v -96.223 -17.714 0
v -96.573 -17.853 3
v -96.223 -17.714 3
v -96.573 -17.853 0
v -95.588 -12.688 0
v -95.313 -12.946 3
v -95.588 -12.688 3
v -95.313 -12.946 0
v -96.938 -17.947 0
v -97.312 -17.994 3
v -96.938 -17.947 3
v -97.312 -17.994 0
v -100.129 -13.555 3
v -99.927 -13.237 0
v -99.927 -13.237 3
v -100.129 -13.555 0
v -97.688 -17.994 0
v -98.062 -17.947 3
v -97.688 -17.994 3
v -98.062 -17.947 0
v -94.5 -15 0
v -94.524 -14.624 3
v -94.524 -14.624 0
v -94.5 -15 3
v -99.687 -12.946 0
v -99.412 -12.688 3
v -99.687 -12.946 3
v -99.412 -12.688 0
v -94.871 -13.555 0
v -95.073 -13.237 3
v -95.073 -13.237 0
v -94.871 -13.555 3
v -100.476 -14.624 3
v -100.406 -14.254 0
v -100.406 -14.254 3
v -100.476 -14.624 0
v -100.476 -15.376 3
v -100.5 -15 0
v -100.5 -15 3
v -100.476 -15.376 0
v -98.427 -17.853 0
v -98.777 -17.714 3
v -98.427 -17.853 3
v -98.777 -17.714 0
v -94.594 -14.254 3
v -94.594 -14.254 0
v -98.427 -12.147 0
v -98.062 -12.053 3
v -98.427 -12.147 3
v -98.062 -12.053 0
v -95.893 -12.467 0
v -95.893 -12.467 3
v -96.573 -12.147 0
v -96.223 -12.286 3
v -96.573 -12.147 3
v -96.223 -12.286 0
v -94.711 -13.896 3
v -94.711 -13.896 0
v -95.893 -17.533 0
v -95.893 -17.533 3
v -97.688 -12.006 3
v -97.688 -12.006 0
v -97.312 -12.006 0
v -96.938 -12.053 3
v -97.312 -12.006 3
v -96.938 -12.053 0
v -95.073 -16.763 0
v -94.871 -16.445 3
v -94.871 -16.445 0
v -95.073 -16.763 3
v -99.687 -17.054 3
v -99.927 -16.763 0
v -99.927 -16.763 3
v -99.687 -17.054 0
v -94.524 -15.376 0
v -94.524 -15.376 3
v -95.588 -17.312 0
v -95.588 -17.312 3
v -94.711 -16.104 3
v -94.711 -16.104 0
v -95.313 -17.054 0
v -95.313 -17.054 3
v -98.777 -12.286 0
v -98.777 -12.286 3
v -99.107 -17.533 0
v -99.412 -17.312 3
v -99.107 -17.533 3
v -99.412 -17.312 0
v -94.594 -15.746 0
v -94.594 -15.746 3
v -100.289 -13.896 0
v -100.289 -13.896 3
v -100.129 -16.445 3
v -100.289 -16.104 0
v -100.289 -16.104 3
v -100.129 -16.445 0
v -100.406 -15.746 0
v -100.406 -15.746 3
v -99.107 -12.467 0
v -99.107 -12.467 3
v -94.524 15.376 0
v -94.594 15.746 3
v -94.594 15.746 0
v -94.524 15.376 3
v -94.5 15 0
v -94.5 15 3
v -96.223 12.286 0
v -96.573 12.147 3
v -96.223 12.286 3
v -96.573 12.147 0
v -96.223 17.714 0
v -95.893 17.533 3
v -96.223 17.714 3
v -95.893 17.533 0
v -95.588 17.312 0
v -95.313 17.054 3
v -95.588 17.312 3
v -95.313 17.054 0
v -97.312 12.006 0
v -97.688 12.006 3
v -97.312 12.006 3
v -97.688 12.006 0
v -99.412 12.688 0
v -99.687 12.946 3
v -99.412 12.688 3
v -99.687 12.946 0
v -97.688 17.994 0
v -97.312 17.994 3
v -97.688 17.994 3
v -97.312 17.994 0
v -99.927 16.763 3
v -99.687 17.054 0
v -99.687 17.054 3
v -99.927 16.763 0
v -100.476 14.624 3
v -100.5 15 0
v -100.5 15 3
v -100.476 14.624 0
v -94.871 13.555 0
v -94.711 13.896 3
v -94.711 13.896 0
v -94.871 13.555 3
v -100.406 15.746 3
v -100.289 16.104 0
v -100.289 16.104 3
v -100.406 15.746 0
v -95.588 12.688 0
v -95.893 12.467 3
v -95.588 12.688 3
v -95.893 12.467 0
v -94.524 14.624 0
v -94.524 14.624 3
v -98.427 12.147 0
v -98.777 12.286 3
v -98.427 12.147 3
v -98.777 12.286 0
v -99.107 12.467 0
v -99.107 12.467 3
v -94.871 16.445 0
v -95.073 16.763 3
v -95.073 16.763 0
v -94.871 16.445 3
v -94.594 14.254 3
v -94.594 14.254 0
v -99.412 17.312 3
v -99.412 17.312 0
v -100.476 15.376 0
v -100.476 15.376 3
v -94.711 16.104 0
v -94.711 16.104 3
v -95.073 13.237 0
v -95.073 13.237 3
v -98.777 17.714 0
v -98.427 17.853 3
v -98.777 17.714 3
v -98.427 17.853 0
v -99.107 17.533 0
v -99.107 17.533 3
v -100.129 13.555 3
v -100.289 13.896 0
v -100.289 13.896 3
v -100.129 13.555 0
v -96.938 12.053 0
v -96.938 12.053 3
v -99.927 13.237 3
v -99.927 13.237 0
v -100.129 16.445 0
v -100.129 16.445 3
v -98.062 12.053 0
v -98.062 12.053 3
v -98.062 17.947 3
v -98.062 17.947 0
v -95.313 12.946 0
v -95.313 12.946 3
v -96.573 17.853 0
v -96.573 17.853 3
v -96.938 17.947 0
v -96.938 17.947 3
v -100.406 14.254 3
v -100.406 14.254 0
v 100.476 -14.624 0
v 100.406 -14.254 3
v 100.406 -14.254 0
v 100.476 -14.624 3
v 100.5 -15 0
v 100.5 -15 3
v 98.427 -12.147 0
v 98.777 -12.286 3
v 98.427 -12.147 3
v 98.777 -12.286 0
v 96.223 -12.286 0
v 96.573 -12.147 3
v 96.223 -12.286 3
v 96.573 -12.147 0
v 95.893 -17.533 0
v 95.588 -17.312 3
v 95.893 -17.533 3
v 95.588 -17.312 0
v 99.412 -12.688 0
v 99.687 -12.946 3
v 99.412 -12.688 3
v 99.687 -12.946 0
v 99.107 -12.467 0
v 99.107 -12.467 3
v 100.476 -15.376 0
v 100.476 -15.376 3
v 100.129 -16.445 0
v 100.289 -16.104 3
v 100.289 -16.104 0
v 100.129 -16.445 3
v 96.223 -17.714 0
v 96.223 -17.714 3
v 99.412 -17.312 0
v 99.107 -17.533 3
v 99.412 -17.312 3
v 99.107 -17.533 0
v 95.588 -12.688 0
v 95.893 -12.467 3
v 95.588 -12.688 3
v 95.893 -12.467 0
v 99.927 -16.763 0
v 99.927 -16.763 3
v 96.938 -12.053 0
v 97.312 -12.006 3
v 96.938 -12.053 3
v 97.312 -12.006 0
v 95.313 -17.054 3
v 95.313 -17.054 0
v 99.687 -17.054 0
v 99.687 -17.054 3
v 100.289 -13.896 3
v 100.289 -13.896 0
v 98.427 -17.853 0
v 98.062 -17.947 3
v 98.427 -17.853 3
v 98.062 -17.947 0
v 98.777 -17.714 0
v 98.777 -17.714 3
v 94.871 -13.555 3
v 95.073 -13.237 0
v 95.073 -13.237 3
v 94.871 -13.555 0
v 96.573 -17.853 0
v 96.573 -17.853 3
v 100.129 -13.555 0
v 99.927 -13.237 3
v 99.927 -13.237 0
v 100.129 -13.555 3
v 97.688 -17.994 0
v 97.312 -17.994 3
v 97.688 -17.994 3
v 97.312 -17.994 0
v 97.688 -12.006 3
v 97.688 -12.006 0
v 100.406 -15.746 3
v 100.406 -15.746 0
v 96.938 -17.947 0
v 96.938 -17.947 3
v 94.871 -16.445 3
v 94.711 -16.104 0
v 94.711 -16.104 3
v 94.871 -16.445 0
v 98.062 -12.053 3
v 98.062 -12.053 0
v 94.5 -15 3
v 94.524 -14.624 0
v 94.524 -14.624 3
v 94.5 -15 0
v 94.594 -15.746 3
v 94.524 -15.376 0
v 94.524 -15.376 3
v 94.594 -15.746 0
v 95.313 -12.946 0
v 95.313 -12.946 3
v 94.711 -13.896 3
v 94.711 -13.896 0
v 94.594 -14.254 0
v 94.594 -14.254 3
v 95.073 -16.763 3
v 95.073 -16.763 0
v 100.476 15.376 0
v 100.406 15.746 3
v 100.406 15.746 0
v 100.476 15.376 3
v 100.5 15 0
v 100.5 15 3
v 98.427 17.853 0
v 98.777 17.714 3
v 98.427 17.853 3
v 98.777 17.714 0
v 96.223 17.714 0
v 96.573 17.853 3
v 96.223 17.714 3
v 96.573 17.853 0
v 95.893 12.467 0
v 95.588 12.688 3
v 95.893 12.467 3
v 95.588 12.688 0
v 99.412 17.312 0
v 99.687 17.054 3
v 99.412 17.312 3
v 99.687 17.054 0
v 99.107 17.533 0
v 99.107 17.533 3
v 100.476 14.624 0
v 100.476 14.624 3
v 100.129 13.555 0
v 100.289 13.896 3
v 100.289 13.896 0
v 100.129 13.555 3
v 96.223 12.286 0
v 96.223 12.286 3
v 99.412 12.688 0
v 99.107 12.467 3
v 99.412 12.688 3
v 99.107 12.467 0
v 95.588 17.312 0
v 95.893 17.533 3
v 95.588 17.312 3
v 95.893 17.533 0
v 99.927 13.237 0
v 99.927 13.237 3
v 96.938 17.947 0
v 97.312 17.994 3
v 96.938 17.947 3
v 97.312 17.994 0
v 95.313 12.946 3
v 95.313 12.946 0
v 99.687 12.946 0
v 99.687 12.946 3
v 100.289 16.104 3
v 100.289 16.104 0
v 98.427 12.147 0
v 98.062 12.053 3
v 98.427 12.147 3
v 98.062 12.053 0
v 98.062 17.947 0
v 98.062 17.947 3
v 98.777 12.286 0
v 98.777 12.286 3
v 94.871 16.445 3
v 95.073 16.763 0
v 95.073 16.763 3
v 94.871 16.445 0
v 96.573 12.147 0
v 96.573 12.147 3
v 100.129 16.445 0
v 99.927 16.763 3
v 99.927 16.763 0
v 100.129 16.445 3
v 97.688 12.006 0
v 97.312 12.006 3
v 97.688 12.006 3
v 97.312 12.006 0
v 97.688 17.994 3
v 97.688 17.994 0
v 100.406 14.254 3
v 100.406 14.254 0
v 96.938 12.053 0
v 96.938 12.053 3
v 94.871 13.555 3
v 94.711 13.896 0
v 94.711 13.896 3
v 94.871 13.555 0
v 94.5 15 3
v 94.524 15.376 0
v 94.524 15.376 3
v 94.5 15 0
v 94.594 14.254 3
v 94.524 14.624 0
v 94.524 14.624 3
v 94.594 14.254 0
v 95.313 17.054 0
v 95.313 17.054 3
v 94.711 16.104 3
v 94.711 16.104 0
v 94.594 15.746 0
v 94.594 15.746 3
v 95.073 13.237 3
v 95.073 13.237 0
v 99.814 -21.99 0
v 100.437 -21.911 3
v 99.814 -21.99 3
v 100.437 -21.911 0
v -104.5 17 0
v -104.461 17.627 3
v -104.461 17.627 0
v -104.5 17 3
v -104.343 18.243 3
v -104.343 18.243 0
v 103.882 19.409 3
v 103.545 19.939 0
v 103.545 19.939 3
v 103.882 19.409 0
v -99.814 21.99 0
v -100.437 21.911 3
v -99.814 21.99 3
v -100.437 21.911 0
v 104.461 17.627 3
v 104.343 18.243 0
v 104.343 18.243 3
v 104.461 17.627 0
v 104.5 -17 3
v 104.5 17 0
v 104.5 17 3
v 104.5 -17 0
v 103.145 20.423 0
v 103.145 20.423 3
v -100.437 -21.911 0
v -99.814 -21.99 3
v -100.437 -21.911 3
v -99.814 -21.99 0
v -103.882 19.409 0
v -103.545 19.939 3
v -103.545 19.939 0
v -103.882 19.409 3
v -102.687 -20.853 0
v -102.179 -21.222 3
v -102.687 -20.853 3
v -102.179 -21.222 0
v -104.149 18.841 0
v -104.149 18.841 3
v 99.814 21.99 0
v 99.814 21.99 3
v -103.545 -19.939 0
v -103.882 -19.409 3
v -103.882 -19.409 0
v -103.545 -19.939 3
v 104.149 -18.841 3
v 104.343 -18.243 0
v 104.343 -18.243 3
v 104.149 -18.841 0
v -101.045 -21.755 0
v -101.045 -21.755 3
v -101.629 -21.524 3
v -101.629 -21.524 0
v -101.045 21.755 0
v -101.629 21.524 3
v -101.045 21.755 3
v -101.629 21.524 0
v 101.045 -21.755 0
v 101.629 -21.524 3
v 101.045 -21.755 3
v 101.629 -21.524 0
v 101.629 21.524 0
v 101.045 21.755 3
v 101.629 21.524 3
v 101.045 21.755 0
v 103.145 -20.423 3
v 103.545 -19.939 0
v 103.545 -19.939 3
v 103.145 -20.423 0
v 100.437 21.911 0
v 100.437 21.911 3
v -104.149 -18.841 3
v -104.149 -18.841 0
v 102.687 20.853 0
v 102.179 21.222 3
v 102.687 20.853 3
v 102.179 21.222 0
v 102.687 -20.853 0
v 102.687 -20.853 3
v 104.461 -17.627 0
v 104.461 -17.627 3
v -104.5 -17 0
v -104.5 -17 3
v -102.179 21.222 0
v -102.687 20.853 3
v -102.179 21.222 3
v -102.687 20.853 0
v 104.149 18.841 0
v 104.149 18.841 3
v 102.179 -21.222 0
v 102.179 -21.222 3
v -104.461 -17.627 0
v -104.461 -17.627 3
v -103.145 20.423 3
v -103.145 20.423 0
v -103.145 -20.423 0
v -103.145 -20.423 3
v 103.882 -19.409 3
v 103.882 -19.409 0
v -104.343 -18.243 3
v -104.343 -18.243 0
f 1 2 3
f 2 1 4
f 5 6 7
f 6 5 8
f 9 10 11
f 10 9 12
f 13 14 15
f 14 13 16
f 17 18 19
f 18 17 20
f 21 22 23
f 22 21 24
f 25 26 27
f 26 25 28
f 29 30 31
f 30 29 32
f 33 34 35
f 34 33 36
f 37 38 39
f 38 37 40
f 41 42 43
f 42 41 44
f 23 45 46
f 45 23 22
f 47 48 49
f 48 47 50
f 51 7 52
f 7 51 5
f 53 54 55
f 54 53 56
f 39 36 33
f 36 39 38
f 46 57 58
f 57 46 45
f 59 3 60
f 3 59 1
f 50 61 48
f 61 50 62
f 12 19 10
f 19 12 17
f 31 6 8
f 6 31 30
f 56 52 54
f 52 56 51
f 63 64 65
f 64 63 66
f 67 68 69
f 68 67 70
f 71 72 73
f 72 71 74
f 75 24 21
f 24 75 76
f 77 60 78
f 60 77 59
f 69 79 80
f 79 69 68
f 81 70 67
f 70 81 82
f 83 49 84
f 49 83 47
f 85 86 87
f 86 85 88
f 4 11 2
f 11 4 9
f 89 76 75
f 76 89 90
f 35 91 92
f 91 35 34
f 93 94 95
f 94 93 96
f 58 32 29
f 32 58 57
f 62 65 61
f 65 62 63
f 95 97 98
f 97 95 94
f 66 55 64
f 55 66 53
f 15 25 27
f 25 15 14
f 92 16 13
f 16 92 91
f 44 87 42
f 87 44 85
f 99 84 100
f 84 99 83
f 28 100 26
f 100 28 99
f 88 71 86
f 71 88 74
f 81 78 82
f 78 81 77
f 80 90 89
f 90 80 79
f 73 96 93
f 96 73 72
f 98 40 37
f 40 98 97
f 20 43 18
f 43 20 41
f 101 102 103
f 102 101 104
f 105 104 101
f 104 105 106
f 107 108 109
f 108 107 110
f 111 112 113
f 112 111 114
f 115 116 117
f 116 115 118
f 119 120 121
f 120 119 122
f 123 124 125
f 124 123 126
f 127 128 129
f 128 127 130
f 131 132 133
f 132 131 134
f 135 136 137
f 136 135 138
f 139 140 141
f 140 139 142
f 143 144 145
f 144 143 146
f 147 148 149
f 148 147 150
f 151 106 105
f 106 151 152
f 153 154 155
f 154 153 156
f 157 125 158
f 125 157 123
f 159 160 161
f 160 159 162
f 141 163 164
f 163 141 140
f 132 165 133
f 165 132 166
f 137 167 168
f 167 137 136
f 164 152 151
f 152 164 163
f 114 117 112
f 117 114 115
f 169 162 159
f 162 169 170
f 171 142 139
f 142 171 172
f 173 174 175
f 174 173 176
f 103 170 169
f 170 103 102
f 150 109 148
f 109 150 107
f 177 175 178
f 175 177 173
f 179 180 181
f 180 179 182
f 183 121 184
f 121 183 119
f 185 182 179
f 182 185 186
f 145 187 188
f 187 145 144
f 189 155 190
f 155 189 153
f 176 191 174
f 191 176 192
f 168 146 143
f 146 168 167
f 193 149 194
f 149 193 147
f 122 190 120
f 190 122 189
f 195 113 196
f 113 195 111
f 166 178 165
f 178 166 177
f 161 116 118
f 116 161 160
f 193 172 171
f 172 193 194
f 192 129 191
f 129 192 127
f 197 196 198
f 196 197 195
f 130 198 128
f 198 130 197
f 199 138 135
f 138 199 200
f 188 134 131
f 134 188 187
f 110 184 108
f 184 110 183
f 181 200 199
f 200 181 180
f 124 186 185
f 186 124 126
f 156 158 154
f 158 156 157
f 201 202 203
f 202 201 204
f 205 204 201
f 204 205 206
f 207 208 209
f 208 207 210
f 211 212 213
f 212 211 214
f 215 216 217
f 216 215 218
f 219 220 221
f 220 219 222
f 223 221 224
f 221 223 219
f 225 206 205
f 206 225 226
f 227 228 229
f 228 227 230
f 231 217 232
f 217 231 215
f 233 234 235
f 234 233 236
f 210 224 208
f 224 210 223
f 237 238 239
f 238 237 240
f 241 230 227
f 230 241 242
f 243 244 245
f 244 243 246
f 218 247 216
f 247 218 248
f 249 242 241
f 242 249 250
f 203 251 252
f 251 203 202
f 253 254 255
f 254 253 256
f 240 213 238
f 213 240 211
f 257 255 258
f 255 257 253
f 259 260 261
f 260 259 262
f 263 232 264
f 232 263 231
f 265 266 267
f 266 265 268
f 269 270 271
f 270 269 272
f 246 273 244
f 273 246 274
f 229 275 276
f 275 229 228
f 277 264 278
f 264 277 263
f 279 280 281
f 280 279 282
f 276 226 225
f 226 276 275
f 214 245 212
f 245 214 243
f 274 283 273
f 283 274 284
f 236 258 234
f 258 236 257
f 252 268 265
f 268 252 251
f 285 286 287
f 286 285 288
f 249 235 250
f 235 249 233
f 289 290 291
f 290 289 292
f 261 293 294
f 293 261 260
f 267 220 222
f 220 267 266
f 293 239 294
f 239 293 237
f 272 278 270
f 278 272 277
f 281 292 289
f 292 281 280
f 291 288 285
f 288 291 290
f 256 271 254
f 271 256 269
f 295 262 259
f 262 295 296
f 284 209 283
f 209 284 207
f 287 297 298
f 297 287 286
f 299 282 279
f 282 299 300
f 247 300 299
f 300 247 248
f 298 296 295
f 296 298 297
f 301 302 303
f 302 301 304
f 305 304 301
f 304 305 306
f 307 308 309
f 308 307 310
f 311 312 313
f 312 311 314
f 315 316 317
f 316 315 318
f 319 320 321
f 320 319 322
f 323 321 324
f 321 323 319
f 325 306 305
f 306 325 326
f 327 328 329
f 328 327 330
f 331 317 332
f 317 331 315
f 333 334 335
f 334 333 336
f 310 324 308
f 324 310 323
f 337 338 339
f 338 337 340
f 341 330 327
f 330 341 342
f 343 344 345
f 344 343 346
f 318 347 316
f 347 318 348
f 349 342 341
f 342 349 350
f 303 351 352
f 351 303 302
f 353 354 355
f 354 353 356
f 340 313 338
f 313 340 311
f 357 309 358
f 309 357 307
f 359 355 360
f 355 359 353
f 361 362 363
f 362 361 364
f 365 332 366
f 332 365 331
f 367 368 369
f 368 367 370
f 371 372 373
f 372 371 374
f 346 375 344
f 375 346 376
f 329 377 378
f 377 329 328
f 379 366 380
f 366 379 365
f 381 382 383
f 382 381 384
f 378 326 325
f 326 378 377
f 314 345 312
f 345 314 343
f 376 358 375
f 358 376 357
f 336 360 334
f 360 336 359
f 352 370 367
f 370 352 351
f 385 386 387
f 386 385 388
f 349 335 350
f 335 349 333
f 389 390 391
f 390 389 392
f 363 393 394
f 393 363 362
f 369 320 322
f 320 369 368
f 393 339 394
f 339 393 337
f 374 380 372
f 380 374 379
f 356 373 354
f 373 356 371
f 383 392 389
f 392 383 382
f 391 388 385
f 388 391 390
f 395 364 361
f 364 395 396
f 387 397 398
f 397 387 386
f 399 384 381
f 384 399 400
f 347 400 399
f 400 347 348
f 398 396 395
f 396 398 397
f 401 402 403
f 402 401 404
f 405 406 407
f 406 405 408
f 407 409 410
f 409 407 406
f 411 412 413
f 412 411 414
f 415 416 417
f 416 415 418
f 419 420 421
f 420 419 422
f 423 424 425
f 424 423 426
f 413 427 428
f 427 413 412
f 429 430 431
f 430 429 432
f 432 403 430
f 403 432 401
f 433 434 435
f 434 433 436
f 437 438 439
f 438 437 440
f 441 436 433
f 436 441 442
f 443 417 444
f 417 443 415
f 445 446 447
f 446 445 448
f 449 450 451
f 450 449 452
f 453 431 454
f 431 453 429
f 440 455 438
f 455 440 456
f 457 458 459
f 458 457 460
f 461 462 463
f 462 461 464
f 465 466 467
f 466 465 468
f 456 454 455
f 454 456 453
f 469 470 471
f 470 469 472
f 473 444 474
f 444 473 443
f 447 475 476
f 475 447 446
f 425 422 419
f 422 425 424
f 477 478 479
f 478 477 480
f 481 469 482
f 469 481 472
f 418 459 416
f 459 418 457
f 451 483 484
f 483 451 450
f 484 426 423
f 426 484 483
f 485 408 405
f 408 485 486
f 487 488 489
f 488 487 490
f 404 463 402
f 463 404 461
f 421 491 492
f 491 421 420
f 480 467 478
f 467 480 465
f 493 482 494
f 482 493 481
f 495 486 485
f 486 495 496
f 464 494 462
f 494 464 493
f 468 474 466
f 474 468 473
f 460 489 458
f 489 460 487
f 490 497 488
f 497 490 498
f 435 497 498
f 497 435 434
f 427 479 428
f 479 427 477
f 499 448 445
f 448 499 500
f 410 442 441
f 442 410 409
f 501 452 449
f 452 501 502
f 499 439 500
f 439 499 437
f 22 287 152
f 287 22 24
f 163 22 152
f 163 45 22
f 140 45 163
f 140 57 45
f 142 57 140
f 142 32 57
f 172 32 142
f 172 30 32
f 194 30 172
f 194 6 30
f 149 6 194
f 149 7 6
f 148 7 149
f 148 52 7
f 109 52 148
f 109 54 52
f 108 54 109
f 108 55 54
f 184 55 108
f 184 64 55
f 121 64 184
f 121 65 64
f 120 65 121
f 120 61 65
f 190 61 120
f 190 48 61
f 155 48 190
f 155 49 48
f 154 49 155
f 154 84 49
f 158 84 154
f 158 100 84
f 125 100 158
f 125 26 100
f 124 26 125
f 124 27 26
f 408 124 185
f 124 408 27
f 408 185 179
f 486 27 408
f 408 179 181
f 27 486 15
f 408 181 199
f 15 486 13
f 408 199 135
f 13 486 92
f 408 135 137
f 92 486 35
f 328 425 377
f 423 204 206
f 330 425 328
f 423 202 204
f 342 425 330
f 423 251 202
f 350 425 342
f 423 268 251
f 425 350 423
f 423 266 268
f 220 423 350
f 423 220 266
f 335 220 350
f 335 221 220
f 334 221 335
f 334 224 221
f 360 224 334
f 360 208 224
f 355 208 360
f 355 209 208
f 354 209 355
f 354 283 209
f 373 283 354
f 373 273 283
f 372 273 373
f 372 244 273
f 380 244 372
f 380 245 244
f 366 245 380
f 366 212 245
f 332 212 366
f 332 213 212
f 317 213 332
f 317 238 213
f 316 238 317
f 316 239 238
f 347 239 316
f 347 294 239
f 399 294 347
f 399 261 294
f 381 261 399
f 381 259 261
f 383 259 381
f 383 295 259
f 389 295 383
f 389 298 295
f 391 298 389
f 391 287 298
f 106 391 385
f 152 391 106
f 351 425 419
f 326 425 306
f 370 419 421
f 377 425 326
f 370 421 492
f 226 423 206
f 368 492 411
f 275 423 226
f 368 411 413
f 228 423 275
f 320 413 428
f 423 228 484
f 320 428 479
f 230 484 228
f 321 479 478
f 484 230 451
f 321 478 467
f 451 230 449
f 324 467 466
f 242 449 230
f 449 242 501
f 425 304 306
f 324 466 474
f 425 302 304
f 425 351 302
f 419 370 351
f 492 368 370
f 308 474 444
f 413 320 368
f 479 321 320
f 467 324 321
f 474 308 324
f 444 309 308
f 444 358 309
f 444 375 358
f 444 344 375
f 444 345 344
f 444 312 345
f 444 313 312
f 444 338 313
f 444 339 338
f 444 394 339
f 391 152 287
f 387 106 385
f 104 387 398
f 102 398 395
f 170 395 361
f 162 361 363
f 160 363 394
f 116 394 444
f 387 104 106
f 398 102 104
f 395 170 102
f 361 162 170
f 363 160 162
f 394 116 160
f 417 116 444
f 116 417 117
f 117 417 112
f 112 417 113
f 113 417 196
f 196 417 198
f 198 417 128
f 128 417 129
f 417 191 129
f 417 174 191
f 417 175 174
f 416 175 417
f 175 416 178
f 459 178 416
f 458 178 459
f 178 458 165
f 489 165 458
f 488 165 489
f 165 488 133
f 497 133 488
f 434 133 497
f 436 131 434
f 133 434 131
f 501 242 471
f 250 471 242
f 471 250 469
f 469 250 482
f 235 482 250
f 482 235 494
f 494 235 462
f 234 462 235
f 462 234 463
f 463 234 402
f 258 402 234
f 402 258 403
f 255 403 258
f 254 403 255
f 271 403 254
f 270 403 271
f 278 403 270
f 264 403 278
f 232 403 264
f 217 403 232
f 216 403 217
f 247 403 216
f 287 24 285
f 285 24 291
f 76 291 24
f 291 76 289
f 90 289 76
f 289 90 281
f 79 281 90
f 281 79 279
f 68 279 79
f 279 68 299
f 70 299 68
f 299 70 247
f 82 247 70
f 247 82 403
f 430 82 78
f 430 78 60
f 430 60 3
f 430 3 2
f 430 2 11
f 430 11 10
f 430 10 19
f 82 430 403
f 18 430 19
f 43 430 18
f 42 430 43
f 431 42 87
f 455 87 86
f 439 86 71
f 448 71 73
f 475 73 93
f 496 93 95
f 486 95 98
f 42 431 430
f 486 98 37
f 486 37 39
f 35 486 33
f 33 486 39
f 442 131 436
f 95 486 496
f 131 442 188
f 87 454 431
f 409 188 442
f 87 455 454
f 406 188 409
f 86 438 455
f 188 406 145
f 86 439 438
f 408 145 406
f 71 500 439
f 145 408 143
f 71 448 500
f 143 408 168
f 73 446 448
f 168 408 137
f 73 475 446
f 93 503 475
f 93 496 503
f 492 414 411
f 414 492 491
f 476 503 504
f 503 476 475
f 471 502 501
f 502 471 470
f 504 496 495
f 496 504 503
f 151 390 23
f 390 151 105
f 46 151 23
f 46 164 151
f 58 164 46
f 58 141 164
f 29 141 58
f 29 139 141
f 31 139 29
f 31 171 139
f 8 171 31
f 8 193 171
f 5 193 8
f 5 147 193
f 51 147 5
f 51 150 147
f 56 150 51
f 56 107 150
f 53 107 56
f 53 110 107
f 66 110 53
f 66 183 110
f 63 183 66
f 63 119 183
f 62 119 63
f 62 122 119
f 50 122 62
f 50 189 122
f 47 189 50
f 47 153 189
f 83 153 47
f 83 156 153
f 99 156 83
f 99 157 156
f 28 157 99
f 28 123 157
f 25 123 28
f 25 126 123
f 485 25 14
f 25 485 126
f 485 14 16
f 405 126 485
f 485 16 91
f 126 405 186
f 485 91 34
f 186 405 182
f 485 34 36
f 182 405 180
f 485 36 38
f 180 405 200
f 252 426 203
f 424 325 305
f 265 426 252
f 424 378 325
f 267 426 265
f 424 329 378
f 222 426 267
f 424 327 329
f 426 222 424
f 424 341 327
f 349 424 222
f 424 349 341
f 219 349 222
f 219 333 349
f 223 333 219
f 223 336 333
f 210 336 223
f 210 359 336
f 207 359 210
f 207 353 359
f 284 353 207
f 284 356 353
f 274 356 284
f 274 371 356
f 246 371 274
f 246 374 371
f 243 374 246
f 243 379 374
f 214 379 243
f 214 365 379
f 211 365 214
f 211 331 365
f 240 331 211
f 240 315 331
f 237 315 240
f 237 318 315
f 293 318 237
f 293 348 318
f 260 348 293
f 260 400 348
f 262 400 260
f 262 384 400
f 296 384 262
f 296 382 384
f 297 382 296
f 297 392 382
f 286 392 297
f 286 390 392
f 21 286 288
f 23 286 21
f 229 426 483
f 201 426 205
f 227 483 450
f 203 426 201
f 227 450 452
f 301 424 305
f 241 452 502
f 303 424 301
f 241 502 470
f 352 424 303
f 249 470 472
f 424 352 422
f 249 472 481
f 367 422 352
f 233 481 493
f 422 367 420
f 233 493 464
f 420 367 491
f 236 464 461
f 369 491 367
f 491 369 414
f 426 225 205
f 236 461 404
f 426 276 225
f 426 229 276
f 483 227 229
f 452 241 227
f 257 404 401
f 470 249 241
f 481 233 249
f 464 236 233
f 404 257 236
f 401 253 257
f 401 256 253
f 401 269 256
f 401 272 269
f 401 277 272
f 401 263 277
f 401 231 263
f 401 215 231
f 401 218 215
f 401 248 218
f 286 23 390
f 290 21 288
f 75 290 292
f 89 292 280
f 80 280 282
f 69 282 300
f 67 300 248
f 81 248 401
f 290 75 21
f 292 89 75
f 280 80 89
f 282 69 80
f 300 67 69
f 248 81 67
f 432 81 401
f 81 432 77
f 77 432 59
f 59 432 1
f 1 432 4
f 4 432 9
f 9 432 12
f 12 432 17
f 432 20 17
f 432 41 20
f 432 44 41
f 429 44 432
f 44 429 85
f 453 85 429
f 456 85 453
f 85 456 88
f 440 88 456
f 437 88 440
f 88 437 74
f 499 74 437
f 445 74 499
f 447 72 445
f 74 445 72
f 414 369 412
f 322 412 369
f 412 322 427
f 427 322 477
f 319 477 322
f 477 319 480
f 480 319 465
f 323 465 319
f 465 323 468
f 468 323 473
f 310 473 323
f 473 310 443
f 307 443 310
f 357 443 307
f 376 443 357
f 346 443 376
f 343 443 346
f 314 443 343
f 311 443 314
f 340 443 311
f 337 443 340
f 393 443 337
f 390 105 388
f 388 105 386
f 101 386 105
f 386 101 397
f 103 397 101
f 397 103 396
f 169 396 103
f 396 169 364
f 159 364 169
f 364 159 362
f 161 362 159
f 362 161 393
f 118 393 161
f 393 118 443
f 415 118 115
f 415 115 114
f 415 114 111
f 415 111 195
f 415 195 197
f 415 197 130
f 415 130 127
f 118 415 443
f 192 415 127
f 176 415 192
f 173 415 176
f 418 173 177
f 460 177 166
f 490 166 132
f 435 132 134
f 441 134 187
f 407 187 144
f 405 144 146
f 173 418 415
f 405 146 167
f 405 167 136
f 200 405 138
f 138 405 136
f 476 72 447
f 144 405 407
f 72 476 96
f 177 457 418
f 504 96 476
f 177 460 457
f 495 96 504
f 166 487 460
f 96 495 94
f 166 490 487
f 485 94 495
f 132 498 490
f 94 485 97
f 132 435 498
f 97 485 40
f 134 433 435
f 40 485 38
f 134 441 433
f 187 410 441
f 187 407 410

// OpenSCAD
$fn = 50;


difference() {
	union() {
		hull() {
			translate(v = [-99.5000000000, 17.0000000000, 0]) {
				cylinder(h = 3, r = 5);
			}
			translate(v = [99.5000000000, 17.0000000000, 0]) {
				cylinder(h = 3, r = 5);
			}
			translate(v = [-99.5000000000, -17.0000000000, 0]) {
				cylinder(h = 3, r = 5);
			}
			translate(v = [99.5000000000, -17.0000000000, 0]) {
				cylinder(h = 3, r = 5);
			}
		}
	}
	union() {
		translate(v = [-97.5000000000, -15.0000000000, -100.0000000000]) {
			cylinder(h = 200, r = 3.0000000000);
		}
		translate(v = [-97.5000000000, 15.0000000000, -100.0000000000]) {
			cylinder(h = 200, r = 3.0000000000);
		}
		translate(v = [97.5000000000, -15.0000000000, -100.0000000000]) {
			cylinder(h = 200, r = 3.0000000000);
		}
		translate(v = [97.5000000000, 15.0000000000, -100.0000000000]) {
			cylinder(h = 200, r = 3.0000000000);
		}
	}
}
